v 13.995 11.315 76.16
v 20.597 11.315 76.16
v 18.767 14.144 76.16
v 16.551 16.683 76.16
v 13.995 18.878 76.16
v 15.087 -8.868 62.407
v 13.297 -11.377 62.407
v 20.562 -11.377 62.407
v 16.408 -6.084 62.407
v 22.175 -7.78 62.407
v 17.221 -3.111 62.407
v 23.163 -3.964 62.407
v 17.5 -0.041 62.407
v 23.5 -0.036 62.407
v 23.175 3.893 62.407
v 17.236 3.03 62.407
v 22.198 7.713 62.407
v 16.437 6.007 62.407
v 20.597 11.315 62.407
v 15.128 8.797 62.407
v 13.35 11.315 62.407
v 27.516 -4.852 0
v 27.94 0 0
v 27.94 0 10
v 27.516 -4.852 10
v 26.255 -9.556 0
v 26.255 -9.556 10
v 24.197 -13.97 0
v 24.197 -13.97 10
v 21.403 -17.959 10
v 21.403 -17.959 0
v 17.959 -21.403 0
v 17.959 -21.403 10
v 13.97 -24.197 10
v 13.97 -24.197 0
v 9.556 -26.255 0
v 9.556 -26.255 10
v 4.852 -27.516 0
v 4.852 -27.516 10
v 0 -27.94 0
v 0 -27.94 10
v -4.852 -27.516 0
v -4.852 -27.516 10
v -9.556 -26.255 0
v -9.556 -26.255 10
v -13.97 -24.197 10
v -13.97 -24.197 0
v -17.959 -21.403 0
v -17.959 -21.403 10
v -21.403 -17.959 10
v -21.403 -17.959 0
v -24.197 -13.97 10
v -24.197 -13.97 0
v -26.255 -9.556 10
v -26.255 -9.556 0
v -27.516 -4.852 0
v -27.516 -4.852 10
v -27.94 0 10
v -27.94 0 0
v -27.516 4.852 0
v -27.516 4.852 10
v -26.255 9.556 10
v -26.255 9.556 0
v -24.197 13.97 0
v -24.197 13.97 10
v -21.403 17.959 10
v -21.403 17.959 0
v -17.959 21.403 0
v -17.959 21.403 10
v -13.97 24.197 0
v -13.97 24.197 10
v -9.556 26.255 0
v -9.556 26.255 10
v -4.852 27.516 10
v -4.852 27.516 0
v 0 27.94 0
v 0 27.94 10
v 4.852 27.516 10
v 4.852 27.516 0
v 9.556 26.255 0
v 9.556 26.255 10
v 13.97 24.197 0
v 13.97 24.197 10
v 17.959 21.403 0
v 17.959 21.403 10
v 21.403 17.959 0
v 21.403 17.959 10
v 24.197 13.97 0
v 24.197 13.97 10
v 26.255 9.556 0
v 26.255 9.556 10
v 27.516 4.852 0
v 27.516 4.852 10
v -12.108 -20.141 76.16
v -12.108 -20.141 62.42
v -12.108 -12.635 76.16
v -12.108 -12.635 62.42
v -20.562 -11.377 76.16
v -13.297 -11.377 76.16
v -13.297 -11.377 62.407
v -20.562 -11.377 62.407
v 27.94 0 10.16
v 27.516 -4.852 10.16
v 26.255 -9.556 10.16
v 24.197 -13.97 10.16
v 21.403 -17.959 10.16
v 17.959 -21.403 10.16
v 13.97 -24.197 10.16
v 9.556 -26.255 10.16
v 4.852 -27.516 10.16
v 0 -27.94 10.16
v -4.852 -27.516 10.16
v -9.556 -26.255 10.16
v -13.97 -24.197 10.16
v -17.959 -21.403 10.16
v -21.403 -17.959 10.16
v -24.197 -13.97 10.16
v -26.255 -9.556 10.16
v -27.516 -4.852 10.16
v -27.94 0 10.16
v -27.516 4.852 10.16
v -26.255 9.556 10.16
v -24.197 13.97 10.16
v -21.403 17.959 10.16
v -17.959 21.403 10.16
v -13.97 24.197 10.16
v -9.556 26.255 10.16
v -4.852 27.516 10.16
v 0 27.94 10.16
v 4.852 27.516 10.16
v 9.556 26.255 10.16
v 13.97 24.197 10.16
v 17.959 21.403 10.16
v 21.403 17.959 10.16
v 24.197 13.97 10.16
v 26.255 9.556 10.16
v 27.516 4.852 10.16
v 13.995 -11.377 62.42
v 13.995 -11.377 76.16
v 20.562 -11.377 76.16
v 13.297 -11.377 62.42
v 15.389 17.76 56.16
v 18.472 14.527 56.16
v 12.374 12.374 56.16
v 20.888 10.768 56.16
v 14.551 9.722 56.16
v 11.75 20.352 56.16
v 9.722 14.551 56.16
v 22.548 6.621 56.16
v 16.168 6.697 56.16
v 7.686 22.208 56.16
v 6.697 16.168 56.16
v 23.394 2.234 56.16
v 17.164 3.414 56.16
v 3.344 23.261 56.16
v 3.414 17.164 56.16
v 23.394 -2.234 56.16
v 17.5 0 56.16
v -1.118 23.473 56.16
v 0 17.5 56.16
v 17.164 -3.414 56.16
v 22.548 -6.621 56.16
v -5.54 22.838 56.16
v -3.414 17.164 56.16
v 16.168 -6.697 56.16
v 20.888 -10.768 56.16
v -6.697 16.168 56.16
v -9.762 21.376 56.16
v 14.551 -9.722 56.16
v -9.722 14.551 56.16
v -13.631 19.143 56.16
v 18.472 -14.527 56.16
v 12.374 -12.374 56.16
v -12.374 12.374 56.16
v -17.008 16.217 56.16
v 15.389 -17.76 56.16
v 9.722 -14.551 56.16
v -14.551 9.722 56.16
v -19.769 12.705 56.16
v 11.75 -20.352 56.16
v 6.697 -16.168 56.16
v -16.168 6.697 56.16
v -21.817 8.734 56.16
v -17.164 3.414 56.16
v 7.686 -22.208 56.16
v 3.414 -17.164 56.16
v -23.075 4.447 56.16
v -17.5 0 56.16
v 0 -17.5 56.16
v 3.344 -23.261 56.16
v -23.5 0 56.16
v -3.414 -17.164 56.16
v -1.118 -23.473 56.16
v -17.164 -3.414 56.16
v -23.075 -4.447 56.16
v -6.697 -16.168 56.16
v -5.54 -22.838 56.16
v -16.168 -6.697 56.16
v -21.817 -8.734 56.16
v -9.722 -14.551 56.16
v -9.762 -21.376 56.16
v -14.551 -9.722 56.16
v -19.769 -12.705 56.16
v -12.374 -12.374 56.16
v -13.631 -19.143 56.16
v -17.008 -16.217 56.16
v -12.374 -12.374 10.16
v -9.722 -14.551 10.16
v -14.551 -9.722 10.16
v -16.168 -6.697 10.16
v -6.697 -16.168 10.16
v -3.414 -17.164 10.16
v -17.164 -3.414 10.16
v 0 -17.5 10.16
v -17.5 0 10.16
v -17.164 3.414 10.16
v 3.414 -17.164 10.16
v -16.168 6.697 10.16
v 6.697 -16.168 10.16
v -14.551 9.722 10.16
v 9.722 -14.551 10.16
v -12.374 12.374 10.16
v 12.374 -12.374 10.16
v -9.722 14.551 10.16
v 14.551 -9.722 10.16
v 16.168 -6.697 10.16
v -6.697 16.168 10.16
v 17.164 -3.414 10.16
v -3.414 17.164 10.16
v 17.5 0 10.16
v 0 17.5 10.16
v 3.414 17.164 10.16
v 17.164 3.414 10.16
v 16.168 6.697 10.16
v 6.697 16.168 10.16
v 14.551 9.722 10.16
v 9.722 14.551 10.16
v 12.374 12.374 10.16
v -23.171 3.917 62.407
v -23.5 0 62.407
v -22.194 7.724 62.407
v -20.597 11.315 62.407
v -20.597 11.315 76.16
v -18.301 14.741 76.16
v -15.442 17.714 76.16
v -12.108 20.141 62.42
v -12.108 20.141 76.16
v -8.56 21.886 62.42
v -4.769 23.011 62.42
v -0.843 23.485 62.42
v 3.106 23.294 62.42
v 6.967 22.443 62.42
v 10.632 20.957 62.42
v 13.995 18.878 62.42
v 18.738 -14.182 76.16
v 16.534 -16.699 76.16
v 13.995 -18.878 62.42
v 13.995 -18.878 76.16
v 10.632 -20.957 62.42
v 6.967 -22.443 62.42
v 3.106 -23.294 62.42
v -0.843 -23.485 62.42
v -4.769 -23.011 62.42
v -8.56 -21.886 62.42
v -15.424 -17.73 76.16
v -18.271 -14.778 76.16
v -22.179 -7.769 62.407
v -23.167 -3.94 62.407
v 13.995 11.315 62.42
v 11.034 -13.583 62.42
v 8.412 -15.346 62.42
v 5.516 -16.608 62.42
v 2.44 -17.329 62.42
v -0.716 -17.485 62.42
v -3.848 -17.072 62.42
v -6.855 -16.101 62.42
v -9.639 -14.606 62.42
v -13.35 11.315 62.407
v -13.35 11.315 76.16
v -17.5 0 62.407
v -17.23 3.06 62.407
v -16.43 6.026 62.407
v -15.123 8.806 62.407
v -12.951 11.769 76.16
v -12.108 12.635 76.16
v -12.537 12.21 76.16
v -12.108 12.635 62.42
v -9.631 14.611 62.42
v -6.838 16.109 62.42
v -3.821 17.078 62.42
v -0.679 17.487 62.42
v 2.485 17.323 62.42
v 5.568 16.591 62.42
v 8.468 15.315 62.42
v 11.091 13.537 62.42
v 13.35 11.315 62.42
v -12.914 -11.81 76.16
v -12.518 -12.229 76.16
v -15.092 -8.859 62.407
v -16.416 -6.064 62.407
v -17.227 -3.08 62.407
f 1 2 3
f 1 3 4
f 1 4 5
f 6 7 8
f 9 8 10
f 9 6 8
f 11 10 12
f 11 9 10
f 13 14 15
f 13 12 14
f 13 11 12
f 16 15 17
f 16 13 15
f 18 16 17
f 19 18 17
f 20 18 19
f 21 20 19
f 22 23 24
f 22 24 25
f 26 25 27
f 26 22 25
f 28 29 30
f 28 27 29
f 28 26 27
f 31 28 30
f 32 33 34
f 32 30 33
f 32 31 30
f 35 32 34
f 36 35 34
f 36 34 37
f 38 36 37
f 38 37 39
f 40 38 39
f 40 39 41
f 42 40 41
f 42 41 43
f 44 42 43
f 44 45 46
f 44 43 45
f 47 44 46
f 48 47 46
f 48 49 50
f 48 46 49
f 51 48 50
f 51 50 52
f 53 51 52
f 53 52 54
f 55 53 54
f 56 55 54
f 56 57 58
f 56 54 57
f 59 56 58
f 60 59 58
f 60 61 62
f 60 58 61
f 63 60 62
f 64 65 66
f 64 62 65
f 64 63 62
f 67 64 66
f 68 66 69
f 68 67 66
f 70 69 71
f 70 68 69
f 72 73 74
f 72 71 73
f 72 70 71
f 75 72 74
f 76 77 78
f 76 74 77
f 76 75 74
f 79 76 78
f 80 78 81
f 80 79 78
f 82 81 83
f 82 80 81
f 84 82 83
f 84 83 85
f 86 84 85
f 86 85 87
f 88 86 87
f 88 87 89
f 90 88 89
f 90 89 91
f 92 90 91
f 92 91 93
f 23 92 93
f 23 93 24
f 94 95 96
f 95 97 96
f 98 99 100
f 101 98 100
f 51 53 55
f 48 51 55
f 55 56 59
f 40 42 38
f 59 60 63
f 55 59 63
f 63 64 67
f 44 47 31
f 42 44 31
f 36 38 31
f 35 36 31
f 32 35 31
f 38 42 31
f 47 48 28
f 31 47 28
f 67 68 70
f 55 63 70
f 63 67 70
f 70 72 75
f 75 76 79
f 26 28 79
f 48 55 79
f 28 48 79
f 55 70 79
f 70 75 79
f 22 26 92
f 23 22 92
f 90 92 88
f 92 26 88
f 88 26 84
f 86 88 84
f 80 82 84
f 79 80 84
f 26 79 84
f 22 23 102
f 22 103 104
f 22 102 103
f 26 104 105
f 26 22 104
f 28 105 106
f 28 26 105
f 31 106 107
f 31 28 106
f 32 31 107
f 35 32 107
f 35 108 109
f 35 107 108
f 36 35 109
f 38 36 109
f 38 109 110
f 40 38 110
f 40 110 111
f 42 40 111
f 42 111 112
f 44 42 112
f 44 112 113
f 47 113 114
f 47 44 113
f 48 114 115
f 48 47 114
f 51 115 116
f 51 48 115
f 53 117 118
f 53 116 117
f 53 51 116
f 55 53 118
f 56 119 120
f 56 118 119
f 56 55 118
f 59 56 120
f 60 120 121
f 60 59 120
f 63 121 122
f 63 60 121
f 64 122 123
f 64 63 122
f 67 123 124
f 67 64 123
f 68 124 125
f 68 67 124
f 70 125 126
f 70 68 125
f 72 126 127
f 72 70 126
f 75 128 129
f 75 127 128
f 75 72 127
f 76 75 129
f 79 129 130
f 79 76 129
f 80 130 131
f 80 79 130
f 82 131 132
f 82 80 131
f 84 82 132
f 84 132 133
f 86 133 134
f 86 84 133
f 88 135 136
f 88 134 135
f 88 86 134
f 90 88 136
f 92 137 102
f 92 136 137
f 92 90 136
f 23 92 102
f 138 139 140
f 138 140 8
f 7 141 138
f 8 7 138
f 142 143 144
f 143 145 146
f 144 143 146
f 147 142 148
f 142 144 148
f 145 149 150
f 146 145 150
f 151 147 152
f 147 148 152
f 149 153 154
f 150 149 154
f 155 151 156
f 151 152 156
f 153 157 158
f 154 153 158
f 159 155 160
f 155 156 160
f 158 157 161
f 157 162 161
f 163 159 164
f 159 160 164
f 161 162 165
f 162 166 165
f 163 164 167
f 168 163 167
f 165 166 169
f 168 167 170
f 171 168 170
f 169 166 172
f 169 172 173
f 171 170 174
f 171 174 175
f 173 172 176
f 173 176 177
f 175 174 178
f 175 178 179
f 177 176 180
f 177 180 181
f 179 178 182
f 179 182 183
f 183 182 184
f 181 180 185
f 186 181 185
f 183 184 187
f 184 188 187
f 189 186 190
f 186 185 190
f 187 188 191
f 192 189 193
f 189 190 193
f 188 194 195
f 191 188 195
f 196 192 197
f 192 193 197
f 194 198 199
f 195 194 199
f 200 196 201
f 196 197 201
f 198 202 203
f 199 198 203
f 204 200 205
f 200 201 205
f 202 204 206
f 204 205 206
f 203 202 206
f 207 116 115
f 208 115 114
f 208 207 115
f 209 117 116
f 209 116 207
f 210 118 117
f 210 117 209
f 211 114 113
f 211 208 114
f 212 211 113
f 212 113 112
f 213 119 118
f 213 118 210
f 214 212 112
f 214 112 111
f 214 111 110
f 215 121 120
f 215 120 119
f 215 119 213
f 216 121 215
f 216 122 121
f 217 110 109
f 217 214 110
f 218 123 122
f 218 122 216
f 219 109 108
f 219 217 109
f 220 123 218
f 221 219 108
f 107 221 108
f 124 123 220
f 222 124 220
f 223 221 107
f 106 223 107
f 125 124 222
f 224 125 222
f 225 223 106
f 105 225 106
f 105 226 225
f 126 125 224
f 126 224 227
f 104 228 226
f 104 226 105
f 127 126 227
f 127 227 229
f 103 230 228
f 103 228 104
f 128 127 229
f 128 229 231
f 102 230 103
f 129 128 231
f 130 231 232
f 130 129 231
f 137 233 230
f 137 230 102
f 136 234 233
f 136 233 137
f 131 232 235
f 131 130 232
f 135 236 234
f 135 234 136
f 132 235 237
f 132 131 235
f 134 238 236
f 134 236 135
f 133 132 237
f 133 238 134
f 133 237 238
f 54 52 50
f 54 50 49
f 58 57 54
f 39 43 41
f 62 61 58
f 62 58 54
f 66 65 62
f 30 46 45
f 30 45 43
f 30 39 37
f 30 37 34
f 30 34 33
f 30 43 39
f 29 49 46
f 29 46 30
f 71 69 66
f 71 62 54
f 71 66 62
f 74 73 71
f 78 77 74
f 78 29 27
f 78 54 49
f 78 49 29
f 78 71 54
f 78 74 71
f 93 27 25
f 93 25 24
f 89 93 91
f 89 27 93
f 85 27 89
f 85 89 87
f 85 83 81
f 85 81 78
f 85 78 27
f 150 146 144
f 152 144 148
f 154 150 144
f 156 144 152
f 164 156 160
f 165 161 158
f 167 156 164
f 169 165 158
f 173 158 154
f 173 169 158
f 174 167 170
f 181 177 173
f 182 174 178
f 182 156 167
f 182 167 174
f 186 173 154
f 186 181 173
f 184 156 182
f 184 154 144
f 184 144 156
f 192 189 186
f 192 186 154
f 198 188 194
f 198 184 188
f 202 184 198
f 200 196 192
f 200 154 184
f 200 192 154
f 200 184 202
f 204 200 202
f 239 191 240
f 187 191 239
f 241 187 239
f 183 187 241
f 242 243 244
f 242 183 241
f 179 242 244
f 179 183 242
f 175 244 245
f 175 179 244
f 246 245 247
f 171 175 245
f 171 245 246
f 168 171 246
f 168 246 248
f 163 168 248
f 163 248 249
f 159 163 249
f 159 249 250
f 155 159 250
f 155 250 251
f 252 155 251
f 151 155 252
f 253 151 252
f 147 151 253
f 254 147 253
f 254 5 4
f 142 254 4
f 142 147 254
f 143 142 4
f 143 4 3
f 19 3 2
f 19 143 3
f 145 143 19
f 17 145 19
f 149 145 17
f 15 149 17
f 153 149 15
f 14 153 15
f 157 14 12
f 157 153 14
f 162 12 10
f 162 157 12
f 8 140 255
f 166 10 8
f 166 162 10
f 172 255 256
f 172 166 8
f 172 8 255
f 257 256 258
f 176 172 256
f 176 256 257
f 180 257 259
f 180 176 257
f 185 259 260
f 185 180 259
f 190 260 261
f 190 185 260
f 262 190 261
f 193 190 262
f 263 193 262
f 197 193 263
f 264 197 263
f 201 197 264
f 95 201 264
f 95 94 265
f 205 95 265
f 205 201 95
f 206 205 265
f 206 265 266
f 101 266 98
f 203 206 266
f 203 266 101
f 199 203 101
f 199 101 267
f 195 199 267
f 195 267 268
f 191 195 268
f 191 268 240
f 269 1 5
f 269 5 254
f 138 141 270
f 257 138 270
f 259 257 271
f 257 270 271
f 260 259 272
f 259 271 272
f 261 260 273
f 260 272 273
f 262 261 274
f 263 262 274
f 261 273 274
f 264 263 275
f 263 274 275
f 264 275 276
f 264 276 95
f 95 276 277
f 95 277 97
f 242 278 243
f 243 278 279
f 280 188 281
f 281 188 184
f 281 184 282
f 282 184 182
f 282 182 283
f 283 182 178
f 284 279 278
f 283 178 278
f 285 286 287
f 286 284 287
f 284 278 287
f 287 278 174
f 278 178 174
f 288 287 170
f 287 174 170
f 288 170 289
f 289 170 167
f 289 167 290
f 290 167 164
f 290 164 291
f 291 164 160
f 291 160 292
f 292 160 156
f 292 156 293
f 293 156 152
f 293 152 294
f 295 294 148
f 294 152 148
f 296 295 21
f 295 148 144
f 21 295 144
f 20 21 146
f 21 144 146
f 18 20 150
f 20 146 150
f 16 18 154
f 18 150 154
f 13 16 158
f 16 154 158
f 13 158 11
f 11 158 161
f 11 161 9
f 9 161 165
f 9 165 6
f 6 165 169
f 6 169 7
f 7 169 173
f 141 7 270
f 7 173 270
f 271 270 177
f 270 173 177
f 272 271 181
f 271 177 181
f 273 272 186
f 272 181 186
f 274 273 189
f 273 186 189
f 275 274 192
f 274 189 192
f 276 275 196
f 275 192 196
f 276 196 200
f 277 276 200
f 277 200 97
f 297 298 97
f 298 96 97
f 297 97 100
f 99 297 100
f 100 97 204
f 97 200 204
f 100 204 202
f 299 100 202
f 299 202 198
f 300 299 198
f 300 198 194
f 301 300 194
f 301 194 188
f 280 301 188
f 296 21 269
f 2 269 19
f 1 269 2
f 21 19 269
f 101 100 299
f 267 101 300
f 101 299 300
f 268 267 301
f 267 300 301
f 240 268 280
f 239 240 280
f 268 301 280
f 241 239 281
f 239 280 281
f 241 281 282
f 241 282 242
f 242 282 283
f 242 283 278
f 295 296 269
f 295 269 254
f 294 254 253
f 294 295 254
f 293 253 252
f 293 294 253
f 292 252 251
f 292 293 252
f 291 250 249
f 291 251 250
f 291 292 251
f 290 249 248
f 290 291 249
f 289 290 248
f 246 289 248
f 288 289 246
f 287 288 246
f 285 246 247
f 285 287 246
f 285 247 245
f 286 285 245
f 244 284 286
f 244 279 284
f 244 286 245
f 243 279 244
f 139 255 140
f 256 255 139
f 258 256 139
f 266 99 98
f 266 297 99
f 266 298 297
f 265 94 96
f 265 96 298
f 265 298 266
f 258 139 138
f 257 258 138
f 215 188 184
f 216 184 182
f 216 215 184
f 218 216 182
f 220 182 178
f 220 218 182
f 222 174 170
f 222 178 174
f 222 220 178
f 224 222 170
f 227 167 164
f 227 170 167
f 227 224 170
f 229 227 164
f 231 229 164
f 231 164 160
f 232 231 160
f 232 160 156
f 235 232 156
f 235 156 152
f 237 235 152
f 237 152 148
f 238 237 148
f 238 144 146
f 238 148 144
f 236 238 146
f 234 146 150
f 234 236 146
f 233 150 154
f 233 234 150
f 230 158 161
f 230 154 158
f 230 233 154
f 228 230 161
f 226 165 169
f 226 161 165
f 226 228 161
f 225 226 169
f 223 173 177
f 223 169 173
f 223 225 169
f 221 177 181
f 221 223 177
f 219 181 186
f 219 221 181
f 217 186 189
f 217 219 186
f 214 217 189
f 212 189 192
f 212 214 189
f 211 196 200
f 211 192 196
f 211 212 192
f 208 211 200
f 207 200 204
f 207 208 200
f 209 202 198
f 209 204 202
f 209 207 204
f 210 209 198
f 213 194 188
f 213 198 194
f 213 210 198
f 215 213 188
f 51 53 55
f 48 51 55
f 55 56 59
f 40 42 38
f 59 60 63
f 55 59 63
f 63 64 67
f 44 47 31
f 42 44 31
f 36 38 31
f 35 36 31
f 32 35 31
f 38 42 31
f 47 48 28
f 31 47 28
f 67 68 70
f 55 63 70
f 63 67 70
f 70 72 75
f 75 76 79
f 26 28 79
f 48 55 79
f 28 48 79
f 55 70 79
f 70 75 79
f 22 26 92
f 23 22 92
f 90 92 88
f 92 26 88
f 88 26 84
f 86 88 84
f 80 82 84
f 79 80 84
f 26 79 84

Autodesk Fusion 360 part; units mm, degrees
sketch "Sketch1" plane through (0, 0, 0) normal (0, 0, 1) x (1, 0, 0)
  circle A0 centre (0, 0) radius 27.94
  dimension "d1" = 55.88
extrude "Extrude1" add sketch "Sketch1" along normal blind 10.16 makes body 1
sketch "Sketch2" plane through (0, 0, 0) normal (0, 0, 1) x (1, 0, 0)
  circle A0 centre (0, 0) radius 27.94
  dimension "d4" = 55.88
extrude "Extrude2" add sketch "Sketch2" along normal blind 10 separate body makes body 2
sketch "Sketch3" plane through (0, 0, 10.16) normal (0, 0, 1) x (-1, 0, 0)
  circle A0 centre (0, 0) radius 27.94
  circle A1 centre (0, 0) radius 17.5
  dimension "d7" = 35
extrude "Extrude3" add sketch "Sketch3" along normal blind 46 contours A1 bodies 1
sketch "Sketch4" plane through (0, 0, 56.16) normal (0, 0, 1) x (-1, 0, 0)
  circle A0 centre (0, 0) radius 17.5
  circle A1 centre (0, 0) radius 23.5
  dimension "d10" = 47
extrude "Extrude4" add sketch "Sketch4" along normal blind 20 separate body makes body 3
sketch "Sketch5" plane through (0, 0, 0) normal (0, 1, 0) x (1, 0, 0)
  line L0 (-12.1078, -77.9552) -> (13.995, -77.9552)
  line L1 (13.995, -77.9552) -> (13.995, -62.4197)
  line L2 (13.995, -62.4197) -> (-12.1078, -62.4197)
  line L3 (-12.1078, -62.4197) -> (-12.1078, -77.9552)
extrude "Extrude5" cut sketch "Sketch5" against normal blind 80 bodies 3
extrude "Extrude6" cut sketch "Sketch5" along normal blind 45 bodies 3
sketch "Sketch6" plane through (0, 0, 0) normal (1, 0, 0) x (0, 1, 0)
  line L0 (-11.3774, 62.4072) -> (11.3148, 62.4072)
  line L1 (11.3148, 62.4072) -> (11.3148, 78.1358)
  line L2 (11.3148, 78.1358) -> (-11.3774, 78.1358)
  line L3 (-11.3774, 78.1358) -> (-11.3774, 62.4072)
extrude "Extrude7" cut sketch "Sketch6" against normal blind 32 bodies 3
extrude "Extrude8" cut sketch "Sketch6" along normal blind 33 bodies 3
